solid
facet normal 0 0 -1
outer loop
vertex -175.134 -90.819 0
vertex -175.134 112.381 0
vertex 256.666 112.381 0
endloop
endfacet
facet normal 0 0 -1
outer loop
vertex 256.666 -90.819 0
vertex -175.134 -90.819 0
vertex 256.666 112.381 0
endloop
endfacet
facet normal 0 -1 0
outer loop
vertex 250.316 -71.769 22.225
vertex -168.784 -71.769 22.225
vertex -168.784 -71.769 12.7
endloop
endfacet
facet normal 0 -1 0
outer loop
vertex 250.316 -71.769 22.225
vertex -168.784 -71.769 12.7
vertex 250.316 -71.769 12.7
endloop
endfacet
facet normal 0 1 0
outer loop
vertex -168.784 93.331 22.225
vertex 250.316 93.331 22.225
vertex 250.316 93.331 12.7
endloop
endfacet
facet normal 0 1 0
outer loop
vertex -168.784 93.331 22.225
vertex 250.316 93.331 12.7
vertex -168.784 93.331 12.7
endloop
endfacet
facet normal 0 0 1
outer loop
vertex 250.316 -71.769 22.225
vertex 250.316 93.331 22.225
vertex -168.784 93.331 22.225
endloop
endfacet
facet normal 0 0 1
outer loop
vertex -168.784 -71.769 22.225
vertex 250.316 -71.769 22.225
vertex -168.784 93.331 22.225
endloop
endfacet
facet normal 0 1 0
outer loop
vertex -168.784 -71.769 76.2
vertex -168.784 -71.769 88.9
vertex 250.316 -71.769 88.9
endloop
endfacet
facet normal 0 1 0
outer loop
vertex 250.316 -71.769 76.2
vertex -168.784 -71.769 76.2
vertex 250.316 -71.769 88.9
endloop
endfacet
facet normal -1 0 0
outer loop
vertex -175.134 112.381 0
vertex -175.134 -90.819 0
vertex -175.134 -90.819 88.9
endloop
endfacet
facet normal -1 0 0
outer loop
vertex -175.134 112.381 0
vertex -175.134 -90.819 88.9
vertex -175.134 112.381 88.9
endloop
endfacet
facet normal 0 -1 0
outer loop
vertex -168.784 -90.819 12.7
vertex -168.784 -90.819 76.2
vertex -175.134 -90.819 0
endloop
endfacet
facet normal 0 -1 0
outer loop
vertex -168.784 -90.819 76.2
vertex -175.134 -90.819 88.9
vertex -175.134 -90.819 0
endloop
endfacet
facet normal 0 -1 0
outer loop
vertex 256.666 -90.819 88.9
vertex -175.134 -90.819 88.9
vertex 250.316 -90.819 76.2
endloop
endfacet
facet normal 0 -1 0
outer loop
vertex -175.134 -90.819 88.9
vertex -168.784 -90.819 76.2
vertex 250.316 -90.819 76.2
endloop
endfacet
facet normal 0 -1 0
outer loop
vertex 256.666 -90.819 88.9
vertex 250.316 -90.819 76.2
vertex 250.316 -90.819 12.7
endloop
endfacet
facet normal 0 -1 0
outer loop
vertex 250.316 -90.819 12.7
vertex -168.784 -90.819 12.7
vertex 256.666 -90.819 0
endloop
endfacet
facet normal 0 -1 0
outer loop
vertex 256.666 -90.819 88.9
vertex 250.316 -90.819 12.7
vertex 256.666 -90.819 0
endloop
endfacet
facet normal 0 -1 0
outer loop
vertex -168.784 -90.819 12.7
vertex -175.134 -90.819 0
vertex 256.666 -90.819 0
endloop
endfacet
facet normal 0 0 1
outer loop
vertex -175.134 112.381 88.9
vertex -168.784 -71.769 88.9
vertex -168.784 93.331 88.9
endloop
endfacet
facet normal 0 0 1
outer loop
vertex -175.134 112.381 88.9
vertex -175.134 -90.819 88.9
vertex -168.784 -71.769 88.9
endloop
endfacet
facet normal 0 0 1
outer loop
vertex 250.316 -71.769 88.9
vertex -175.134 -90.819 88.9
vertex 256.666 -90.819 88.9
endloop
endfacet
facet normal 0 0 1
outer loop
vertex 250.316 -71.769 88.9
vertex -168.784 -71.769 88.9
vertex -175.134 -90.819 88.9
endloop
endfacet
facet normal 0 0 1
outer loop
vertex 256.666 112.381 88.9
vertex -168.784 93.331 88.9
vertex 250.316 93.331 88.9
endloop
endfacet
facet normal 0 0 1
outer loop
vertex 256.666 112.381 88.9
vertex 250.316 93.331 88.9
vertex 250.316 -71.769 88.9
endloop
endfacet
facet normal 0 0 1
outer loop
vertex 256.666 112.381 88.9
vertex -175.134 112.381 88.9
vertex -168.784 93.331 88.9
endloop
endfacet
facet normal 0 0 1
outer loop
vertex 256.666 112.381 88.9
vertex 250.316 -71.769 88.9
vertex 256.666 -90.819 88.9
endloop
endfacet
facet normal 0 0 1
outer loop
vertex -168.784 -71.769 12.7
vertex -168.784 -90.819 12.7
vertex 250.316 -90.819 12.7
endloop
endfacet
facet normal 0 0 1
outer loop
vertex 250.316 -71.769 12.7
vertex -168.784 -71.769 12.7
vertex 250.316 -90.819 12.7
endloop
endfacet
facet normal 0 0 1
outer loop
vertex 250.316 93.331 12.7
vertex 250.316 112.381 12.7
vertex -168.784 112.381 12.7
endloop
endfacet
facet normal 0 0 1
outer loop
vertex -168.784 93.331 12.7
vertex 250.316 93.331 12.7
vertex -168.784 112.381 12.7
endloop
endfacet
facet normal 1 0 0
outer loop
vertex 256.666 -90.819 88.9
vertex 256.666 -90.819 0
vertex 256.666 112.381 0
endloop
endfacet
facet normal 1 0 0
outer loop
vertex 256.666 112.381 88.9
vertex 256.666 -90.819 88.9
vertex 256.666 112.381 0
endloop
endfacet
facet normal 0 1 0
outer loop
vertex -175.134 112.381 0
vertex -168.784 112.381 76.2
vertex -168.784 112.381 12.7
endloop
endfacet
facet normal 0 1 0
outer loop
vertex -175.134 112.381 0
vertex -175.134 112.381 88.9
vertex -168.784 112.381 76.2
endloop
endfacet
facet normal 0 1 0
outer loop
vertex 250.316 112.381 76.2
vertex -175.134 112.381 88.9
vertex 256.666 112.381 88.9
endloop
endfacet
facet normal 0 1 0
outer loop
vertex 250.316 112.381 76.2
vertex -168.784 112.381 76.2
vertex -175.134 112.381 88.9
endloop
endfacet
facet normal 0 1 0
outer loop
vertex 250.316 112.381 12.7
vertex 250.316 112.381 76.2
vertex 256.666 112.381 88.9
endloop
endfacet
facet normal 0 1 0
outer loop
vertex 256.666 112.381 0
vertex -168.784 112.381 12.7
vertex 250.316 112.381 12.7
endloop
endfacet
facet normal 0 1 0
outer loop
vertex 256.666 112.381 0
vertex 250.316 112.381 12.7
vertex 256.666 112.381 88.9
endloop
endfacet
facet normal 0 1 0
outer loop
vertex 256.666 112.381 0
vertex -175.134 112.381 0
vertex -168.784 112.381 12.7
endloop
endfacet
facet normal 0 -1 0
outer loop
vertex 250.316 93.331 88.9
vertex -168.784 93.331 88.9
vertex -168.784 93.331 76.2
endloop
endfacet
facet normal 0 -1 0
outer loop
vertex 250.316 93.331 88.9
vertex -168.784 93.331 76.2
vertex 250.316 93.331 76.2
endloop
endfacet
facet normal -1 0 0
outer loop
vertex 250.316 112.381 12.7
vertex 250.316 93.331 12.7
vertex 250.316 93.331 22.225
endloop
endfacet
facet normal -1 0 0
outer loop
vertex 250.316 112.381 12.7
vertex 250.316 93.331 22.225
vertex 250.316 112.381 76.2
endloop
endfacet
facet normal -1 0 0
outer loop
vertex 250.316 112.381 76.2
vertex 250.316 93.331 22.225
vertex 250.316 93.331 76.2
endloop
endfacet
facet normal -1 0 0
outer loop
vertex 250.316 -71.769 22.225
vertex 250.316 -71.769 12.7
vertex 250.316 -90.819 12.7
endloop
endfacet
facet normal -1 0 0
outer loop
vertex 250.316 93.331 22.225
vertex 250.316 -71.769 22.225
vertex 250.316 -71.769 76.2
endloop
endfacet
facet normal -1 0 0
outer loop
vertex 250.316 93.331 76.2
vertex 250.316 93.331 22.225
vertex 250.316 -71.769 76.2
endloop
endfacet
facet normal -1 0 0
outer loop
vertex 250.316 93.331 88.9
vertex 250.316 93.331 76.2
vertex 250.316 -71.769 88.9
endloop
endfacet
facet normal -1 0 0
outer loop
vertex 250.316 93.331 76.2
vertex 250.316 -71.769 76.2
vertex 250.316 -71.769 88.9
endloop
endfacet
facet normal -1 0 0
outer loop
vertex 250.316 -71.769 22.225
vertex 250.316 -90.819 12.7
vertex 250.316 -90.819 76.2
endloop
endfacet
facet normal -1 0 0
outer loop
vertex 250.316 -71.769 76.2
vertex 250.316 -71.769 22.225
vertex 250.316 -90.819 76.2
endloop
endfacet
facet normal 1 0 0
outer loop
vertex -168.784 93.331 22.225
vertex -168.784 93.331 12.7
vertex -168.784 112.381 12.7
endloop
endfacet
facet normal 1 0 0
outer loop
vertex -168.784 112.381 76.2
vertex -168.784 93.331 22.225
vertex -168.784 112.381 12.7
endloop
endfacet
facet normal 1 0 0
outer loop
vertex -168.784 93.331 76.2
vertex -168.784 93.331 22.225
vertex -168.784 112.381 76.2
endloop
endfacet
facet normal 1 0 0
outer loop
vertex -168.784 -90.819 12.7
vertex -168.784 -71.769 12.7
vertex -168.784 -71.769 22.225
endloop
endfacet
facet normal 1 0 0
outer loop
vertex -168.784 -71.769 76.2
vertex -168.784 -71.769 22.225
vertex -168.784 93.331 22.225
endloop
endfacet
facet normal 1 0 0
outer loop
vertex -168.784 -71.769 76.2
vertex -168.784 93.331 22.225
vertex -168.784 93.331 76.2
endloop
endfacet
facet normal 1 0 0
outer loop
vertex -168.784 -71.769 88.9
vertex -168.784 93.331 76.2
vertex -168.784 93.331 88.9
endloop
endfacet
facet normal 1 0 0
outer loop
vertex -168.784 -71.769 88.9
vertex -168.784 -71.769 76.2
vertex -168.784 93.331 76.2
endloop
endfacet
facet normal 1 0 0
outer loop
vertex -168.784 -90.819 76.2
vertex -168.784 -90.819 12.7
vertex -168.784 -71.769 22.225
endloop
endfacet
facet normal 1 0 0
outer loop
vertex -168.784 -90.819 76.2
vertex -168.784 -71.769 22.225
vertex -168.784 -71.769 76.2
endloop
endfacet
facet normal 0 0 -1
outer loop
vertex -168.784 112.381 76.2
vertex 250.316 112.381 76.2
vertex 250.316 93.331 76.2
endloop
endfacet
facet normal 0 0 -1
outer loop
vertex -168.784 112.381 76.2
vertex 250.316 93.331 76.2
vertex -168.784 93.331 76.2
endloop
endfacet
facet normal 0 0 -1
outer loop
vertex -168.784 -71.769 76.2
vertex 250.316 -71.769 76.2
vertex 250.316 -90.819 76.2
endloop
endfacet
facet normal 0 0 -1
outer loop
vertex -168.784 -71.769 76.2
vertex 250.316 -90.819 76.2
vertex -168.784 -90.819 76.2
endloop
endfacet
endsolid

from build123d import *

# Parameters (mm, degrees)
F0_W     = 431.8
F0_H     = 203.2
F1_DEPTH = 88.9
F2_W     = 419.1
F2_H     = 53.975
F3_DEPTH = 203.2
F4_W     = 419.1
F4_H     = 165.1
F5_DEPTH = 12.7
F6_W     = 419.1
F6_H     = 9.525
F7_DEPTH = 19.05
F8_W     = 419.1
F8_H     = 9.525
F9_DEPTH = 19.05


with BuildPart() as f1:
    # F0 (on Top) → F1 (new body)
    with BuildSketch(Plane.XY):
        with Locations((40.765872, 10.780569)):
            Rectangle(F0_W, F0_H)
    extrude(amount=F1_DEPTH)

    # F2 (on face) → F3 (cut, through all)
    with BuildSketch(Plane(origin=(0, 112.380569, 0), x_dir=(-1, 0, 0), z_dir=(0, 1, 0))):
        with Locations((-40.765872, 49.2125)):
            Rectangle(F2_W, F2_H)
    extrude(amount=-F3_DEPTH, mode=Mode.SUBTRACT)

    # F4 (on face) → F5 (cut, through all)
    with BuildSketch(Plane.XY.offset(88.9)):
        with Locations((40.765872, 10.780569)):
            Rectangle(F4_W, F4_H)
    extrude(amount=-F5_DEPTH, mode=Mode.SUBTRACT)

    # F6 (on face) → F7 (cut)
    with BuildSketch(Plane(origin=(0, 112.380569, 0), x_dir=(-1, 0, 0), z_dir=(0, 1, 0))):
        with Locations((-40.765872, 17.4625)):
            Rectangle(F6_W, F6_H)
    extrude(amount=-F7_DEPTH, mode=Mode.SUBTRACT)

    # F8 (on face) → F9 (cut)
    with BuildSketch(Plane.XZ.offset(90.819431)):
        with Locations((40.765872, 17.4625)):
            Rectangle(F8_W, F8_H)
    extrude(amount=-F9_DEPTH, mode=Mode.SUBTRACT)


solid = f1.part
